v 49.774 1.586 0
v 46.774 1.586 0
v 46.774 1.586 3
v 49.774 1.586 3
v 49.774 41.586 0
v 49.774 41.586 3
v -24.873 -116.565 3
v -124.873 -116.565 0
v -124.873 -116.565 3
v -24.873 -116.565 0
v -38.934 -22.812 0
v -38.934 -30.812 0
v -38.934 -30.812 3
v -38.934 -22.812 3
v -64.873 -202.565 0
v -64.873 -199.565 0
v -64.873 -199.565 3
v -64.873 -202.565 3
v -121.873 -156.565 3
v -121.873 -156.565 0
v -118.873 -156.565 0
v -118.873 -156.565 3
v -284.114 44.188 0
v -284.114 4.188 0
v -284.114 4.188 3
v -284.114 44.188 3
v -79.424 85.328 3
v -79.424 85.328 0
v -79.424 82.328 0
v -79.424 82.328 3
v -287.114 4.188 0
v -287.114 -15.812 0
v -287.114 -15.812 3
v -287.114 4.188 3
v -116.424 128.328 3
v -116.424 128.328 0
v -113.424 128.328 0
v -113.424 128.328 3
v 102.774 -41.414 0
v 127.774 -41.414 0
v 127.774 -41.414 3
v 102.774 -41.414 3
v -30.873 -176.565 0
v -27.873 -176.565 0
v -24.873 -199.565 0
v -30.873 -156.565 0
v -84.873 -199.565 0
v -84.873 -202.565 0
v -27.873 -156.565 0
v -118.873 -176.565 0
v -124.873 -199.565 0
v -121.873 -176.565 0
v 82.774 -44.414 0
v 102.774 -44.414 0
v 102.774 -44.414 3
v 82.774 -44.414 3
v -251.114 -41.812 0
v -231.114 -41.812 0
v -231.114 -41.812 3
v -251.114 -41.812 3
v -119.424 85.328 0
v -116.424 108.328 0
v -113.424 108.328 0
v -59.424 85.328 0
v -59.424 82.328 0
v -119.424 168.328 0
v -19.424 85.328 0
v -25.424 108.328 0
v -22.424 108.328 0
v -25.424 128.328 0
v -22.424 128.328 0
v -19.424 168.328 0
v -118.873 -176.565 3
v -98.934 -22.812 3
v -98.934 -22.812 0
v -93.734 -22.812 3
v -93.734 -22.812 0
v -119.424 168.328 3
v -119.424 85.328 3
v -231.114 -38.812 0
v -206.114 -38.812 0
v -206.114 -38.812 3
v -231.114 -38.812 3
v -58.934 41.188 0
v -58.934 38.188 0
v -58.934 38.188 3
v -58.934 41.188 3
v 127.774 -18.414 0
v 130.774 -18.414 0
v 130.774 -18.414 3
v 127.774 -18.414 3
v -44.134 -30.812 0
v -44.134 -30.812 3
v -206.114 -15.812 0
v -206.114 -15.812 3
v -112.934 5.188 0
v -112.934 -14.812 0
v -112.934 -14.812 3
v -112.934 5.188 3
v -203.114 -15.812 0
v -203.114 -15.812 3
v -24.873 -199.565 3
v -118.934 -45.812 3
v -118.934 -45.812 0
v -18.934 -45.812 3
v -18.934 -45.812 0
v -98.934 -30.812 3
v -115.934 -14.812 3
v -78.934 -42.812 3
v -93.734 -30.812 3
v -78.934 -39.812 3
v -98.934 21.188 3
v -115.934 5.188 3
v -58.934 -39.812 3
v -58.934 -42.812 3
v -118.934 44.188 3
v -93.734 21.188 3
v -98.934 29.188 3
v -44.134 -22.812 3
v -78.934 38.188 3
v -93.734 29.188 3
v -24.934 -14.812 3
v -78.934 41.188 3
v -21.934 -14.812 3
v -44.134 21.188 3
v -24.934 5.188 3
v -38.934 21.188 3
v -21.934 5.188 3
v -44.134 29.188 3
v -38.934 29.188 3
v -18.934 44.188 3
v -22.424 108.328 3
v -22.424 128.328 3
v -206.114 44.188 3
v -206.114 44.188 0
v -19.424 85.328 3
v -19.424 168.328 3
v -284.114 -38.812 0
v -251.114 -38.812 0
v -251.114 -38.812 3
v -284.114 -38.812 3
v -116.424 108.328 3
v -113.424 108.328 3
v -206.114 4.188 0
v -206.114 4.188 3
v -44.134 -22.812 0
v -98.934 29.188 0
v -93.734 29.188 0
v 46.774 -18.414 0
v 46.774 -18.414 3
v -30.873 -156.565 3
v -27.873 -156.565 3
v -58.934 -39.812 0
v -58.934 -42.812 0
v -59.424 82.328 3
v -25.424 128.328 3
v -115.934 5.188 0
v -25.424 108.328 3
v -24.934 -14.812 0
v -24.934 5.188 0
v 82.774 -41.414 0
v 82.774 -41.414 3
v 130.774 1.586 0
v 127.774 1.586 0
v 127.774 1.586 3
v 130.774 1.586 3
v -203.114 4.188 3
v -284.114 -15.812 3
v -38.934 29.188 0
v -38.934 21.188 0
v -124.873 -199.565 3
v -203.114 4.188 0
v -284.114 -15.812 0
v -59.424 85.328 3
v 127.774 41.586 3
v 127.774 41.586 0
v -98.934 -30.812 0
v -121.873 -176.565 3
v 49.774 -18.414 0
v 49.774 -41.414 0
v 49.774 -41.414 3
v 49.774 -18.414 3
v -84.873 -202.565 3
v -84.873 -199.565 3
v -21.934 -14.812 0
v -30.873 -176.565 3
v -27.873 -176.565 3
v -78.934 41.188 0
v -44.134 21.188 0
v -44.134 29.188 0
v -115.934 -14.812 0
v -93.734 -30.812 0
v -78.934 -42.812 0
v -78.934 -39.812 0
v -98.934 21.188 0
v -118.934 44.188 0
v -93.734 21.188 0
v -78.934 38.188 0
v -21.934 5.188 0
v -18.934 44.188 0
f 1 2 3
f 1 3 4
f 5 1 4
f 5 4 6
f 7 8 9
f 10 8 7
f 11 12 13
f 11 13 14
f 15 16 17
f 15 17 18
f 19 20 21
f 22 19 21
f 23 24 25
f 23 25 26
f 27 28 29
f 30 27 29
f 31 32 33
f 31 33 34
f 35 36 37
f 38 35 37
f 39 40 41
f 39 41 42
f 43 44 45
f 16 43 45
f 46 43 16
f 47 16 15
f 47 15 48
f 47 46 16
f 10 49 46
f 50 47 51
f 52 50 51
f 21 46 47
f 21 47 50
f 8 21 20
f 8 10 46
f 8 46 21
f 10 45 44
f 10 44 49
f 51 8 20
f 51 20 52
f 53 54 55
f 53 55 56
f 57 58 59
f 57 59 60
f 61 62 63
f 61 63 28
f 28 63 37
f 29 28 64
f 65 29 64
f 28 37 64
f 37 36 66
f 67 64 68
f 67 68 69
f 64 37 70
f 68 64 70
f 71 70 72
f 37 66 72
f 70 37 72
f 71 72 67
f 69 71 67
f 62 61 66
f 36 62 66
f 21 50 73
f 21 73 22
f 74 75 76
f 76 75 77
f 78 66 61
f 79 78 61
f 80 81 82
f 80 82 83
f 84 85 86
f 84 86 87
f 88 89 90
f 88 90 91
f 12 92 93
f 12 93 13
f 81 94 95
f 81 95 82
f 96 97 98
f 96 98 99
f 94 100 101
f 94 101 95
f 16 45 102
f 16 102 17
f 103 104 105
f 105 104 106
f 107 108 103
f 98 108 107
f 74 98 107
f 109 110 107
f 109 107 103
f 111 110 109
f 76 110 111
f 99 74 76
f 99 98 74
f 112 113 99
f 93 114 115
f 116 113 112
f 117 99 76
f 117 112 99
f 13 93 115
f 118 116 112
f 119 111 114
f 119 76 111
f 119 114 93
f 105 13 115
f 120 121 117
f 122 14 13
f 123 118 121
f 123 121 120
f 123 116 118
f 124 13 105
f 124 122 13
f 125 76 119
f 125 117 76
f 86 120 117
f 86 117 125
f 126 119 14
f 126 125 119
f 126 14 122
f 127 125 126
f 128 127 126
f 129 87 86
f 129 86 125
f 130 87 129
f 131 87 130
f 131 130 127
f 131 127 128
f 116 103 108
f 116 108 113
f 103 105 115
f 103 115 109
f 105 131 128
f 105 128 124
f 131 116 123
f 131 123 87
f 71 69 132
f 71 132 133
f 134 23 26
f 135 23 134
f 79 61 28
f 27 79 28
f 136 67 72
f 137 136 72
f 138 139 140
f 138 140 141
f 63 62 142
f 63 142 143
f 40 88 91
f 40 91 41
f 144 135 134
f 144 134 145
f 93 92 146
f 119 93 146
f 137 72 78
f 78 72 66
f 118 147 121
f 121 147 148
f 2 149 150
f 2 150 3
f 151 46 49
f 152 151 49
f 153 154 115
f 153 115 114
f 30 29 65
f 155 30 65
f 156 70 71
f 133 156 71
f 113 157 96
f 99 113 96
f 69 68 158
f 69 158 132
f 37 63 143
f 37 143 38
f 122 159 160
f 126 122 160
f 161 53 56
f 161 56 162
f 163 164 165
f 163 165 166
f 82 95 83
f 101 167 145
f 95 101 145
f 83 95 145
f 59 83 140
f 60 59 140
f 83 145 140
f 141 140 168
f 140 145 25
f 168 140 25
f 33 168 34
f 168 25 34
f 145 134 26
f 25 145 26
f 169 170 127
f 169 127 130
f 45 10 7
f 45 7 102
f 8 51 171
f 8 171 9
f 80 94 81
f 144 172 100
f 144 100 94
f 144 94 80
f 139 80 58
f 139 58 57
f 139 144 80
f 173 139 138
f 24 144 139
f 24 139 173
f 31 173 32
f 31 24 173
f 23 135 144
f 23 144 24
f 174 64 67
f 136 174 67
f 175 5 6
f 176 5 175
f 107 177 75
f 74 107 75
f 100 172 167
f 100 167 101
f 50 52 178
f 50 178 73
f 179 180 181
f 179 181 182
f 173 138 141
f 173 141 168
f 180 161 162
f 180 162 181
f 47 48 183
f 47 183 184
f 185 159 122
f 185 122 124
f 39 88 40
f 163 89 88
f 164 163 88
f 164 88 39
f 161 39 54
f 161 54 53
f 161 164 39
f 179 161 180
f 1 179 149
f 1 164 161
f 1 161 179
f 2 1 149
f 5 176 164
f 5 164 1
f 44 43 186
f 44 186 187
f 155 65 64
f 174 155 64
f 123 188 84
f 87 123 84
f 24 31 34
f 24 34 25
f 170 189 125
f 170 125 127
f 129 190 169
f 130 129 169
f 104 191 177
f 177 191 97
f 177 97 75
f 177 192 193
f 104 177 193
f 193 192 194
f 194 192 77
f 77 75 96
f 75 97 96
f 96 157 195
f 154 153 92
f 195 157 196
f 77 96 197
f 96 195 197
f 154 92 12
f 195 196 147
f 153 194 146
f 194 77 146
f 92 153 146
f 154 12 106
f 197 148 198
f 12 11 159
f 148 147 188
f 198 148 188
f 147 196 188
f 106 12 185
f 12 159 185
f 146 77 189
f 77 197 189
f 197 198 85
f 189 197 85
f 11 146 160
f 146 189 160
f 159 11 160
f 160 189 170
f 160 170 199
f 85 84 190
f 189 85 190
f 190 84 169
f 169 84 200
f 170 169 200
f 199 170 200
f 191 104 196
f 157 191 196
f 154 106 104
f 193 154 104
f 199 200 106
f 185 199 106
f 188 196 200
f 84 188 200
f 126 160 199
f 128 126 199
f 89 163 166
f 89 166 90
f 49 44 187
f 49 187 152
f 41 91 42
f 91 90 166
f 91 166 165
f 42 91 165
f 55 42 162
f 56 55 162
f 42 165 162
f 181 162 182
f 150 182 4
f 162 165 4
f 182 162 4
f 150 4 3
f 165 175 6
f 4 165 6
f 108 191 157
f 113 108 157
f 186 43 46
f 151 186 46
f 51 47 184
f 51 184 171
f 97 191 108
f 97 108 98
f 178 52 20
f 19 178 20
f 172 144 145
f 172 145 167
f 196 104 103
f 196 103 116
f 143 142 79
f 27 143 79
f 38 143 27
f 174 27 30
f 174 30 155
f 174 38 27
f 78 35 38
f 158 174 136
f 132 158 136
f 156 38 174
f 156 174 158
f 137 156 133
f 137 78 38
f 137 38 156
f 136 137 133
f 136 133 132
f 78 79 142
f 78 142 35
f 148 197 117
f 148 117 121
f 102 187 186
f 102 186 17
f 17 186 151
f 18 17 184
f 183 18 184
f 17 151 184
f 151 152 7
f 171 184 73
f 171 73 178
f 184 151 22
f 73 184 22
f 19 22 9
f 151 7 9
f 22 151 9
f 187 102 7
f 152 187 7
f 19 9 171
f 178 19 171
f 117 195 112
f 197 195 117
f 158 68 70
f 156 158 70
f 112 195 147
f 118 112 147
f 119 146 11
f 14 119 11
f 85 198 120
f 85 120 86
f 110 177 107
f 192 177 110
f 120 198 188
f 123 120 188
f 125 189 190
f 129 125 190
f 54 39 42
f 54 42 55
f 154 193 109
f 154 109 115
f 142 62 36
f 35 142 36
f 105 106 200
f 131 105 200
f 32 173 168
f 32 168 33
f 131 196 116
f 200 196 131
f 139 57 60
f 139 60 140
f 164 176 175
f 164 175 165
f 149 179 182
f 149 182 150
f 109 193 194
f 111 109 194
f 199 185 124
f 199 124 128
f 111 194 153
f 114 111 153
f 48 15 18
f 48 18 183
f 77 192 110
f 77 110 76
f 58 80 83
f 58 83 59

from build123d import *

# Parameters (mm, degrees)
SKETCH_1_W        = 3
SKETCH_1_H        = 20
EXTRUDE_1_DEPTH   = 3
SKETCH_1_W_2      = 100
SKETCH_1_H_2      = 90
SKETCH_1_W_3      = 20
SKETCH_1_H_3      = 3
SKETCH_1_W_4      = 5.2
SKETCH_1_H_4      = 8
EXTRUDE_1_2_DEPTH = 3
EXTRUDE_1_3_DEPTH = 3
EXTRUDE_1_4_DEPTH = 3
EXTRUDE_1_5_DEPTH = 3


with BuildPart() as part:
    # Эскиз1 → Бобышка-Вытянуть1 (new body)
    with BuildSketch(Plane.XY):
        Polygon((-79.423765196, 85.328335351), (-79.423765196, 82.328335351), (-59.423765196, 82.328335351), (-59.423765196, 85.328335351), (-19.423765196, 85.328335351), (-19.423765196, 168.328335351), (-119.423765196, 168.328335351), (-119.423765196, 85.328335351), align=None)
        with Locations((-114.923765196, 118.328335351)):
            Rectangle(SKETCH_1_W, SKETCH_1_H, mode=Mode.SUBTRACT)
        with Locations((-23.923765196, 118.328335351)):
            Rectangle(SKETCH_1_W, SKETCH_1_H, mode=Mode.SUBTRACT)
    extrude(amount=EXTRUDE_1_DEPTH)


with BuildPart() as body_2:
    # Эскиз1 → Extrude 1 2 (new body)
    with BuildSketch(Plane.XY):
        with Locations((-68.934010152, -0.812182741)):
            Rectangle(SKETCH_1_W_2, SKETCH_1_H_2)
        with Locations((-68.934010152, 39.687817259)):
            Rectangle(SKETCH_1_W_3, SKETCH_1_H_3, mode=Mode.SUBTRACT)
        with Locations((-114.434010152, -4.812182741)):
            Rectangle(SKETCH_1_W, SKETCH_1_H, mode=Mode.SUBTRACT)
        with Locations((-68.934010152, -41.312182741)):
            Rectangle(SKETCH_1_W_3, SKETCH_1_H_3, mode=Mode.SUBTRACT)
        with Locations((-23.434010152, -4.812182741)):
            Rectangle(SKETCH_1_W, SKETCH_1_H, mode=Mode.SUBTRACT)
        with Locations((-96.334010152, -26.812182741)):
            Rectangle(SKETCH_1_W_4, SKETCH_1_H_4, mode=Mode.SUBTRACT)
        with Locations((-96.334010152, 25.187817259)):
            Rectangle(SKETCH_1_W_4, SKETCH_1_H_4, mode=Mode.SUBTRACT)
        with Locations((-41.534010152, -26.812182741)):
            Rectangle(SKETCH_1_W_4, SKETCH_1_H_4, mode=Mode.SUBTRACT)
        with Locations((-41.534010152, 25.187817259)):
            Rectangle(SKETCH_1_W_4, SKETCH_1_H_4, mode=Mode.SUBTRACT)
    extrude(amount=EXTRUDE_1_2_DEPTH)


with BuildPart() as body_3:
    # Эскиз1 → Extrude 1 3 (new body)
    with BuildSketch(Plane.XY):
        Polygon((-284.113705584, 44.187817259), (-206.113705584, 44.187817259), (-206.113705584, 4.187817259), (-203.113705584, 4.187817259), (-203.113705584, -15.812182741), (-206.113705584, -15.812182741), (-206.113705584, -38.812182741), (-231.113705584, -38.812182741), (-231.113705584, -41.812182741), (-251.113705584, -41.812182741), (-251.113705584, -38.812182741), (-284.113705584, -38.812182741), (-284.113705584, -15.812182741), (-287.113705584, -15.812182741), (-287.113705584, 4.187817259), (-284.113705584, 4.187817259), align=None)
    extrude(amount=EXTRUDE_1_3_DEPTH)


with BuildPart() as body_4:
    # Эскиз1 → Extrude 1 4 (new body)
    with BuildSketch(Plane.XY):
        Polygon((-124.873096447, -116.564787817), (-24.873096447, -116.564787817), (-24.873096447, -199.564787817), (-64.873096447, -199.564787817), (-64.873096447, -202.564787817), (-84.873096447, -202.564787817), (-84.873096447, -199.564787817), (-124.873096447, -199.564787817), align=None)
        with Locations((-120.373096447, -166.564787817)):
            Rectangle(SKETCH_1_W, SKETCH_1_H, mode=Mode.SUBTRACT)
        with Locations((-29.373096447, -166.564787817)):
            Rectangle(SKETCH_1_W, SKETCH_1_H, mode=Mode.SUBTRACT)
    extrude(amount=EXTRUDE_1_4_DEPTH)


with BuildPart() as body_5:
    # Эскиз1 → Extrude 1 5 (new body)
    with BuildSketch(Plane.XY):
        Polygon((49.773984997, 41.585858004), (127.773984997, 41.585858004), (127.773984997, 1.585858004), (130.773984997, 1.585858004), (130.773984997, -18.414141996), (127.773984997, -18.414141996), (127.773984997, -41.414141996), (102.773984997, -41.414141996), (102.773984997, -44.414141996), (82.773984997, -44.414141996), (82.773984997, -41.414141996), (49.773984997, -41.414141996), (49.773984997, -18.414141996), (46.773984997, -18.414141996), (46.773984997, 1.585858004), (49.773984997, 1.585858004), align=None)
    extrude(amount=EXTRUDE_1_5_DEPTH)


solid = Compound([part.part, body_2.part, body_3.part, body_4.part, body_5.part])
